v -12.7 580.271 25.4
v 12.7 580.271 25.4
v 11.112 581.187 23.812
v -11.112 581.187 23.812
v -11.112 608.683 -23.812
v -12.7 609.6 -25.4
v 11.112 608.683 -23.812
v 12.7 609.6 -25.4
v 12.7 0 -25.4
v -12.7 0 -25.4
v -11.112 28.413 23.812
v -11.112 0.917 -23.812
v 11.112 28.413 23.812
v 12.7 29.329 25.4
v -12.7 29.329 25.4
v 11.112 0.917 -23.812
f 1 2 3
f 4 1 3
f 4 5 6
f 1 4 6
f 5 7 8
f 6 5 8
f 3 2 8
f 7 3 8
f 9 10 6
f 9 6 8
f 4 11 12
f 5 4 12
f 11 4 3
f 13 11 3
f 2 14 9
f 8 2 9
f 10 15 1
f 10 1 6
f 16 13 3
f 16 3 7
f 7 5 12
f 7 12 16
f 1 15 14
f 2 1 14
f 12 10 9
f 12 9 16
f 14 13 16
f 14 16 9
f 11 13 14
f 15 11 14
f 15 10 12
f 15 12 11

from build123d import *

# Parameters (mm, degrees)
SKETCH1_W               = 25.4
SKETCH1_H               = 50.8
SKETCH1_W_2             = 22.225
SKETCH1_H_2             = 47.625
BOSS_EXTRUDE1_DEPTH     = 609.6
CUT_EXTRUDE1_DEPTH      = 611.657416233
CUT_EXTRUDE2_DEPTH      = 611.261099858
CUT_EXTRUDE2_DEPTH_BACK = 611.261099858


with BuildPart() as part:
    # Sketch1 → Boss-Extrude1 (new body)
    with BuildSketch(Plane(origin=(0, 0, 0), x_dir=(1, 0, 0), z_dir=(0, 1, 0))):
        Rectangle(SKETCH1_W, SKETCH1_H)
        Rectangle(SKETCH1_W_2, SKETCH1_H_2, mode=Mode.SUBTRACT)
    extrude(amount=BOSS_EXTRUDE1_DEPTH)

    # Sketch2 → Cut-Extrude1 (cut, through all)
    with BuildSketch(Plane(origin=(12.7, 0, 0), x_dir=(0, 0, -1), z_dir=(1, 0, 0))):
        Polygon((25.4, 609.6), (-25.4, 609.6), (-25.4, 580.270606325), align=None)
    extrude(amount=-CUT_EXTRUDE1_DEPTH, mode=Mode.SUBTRACT)

    # Sketch3 → Cut-Extrude2 (cut, two sides: drawn at the far end of the back side and taken through both)
    with BuildSketch(Plane(origin=(0, 0, 0), x_dir=(0, 0, -1), z_dir=(1, 0, 0)).offset(-CUT_EXTRUDE2_DEPTH_BACK)):
        Polygon((-25.4, 0), (25.4, 0), (-25.4, 29.329393675), align=None)
    extrude(amount=CUT_EXTRUDE2_DEPTH + CUT_EXTRUDE2_DEPTH_BACK, mode=Mode.SUBTRACT)


solid = part.part
